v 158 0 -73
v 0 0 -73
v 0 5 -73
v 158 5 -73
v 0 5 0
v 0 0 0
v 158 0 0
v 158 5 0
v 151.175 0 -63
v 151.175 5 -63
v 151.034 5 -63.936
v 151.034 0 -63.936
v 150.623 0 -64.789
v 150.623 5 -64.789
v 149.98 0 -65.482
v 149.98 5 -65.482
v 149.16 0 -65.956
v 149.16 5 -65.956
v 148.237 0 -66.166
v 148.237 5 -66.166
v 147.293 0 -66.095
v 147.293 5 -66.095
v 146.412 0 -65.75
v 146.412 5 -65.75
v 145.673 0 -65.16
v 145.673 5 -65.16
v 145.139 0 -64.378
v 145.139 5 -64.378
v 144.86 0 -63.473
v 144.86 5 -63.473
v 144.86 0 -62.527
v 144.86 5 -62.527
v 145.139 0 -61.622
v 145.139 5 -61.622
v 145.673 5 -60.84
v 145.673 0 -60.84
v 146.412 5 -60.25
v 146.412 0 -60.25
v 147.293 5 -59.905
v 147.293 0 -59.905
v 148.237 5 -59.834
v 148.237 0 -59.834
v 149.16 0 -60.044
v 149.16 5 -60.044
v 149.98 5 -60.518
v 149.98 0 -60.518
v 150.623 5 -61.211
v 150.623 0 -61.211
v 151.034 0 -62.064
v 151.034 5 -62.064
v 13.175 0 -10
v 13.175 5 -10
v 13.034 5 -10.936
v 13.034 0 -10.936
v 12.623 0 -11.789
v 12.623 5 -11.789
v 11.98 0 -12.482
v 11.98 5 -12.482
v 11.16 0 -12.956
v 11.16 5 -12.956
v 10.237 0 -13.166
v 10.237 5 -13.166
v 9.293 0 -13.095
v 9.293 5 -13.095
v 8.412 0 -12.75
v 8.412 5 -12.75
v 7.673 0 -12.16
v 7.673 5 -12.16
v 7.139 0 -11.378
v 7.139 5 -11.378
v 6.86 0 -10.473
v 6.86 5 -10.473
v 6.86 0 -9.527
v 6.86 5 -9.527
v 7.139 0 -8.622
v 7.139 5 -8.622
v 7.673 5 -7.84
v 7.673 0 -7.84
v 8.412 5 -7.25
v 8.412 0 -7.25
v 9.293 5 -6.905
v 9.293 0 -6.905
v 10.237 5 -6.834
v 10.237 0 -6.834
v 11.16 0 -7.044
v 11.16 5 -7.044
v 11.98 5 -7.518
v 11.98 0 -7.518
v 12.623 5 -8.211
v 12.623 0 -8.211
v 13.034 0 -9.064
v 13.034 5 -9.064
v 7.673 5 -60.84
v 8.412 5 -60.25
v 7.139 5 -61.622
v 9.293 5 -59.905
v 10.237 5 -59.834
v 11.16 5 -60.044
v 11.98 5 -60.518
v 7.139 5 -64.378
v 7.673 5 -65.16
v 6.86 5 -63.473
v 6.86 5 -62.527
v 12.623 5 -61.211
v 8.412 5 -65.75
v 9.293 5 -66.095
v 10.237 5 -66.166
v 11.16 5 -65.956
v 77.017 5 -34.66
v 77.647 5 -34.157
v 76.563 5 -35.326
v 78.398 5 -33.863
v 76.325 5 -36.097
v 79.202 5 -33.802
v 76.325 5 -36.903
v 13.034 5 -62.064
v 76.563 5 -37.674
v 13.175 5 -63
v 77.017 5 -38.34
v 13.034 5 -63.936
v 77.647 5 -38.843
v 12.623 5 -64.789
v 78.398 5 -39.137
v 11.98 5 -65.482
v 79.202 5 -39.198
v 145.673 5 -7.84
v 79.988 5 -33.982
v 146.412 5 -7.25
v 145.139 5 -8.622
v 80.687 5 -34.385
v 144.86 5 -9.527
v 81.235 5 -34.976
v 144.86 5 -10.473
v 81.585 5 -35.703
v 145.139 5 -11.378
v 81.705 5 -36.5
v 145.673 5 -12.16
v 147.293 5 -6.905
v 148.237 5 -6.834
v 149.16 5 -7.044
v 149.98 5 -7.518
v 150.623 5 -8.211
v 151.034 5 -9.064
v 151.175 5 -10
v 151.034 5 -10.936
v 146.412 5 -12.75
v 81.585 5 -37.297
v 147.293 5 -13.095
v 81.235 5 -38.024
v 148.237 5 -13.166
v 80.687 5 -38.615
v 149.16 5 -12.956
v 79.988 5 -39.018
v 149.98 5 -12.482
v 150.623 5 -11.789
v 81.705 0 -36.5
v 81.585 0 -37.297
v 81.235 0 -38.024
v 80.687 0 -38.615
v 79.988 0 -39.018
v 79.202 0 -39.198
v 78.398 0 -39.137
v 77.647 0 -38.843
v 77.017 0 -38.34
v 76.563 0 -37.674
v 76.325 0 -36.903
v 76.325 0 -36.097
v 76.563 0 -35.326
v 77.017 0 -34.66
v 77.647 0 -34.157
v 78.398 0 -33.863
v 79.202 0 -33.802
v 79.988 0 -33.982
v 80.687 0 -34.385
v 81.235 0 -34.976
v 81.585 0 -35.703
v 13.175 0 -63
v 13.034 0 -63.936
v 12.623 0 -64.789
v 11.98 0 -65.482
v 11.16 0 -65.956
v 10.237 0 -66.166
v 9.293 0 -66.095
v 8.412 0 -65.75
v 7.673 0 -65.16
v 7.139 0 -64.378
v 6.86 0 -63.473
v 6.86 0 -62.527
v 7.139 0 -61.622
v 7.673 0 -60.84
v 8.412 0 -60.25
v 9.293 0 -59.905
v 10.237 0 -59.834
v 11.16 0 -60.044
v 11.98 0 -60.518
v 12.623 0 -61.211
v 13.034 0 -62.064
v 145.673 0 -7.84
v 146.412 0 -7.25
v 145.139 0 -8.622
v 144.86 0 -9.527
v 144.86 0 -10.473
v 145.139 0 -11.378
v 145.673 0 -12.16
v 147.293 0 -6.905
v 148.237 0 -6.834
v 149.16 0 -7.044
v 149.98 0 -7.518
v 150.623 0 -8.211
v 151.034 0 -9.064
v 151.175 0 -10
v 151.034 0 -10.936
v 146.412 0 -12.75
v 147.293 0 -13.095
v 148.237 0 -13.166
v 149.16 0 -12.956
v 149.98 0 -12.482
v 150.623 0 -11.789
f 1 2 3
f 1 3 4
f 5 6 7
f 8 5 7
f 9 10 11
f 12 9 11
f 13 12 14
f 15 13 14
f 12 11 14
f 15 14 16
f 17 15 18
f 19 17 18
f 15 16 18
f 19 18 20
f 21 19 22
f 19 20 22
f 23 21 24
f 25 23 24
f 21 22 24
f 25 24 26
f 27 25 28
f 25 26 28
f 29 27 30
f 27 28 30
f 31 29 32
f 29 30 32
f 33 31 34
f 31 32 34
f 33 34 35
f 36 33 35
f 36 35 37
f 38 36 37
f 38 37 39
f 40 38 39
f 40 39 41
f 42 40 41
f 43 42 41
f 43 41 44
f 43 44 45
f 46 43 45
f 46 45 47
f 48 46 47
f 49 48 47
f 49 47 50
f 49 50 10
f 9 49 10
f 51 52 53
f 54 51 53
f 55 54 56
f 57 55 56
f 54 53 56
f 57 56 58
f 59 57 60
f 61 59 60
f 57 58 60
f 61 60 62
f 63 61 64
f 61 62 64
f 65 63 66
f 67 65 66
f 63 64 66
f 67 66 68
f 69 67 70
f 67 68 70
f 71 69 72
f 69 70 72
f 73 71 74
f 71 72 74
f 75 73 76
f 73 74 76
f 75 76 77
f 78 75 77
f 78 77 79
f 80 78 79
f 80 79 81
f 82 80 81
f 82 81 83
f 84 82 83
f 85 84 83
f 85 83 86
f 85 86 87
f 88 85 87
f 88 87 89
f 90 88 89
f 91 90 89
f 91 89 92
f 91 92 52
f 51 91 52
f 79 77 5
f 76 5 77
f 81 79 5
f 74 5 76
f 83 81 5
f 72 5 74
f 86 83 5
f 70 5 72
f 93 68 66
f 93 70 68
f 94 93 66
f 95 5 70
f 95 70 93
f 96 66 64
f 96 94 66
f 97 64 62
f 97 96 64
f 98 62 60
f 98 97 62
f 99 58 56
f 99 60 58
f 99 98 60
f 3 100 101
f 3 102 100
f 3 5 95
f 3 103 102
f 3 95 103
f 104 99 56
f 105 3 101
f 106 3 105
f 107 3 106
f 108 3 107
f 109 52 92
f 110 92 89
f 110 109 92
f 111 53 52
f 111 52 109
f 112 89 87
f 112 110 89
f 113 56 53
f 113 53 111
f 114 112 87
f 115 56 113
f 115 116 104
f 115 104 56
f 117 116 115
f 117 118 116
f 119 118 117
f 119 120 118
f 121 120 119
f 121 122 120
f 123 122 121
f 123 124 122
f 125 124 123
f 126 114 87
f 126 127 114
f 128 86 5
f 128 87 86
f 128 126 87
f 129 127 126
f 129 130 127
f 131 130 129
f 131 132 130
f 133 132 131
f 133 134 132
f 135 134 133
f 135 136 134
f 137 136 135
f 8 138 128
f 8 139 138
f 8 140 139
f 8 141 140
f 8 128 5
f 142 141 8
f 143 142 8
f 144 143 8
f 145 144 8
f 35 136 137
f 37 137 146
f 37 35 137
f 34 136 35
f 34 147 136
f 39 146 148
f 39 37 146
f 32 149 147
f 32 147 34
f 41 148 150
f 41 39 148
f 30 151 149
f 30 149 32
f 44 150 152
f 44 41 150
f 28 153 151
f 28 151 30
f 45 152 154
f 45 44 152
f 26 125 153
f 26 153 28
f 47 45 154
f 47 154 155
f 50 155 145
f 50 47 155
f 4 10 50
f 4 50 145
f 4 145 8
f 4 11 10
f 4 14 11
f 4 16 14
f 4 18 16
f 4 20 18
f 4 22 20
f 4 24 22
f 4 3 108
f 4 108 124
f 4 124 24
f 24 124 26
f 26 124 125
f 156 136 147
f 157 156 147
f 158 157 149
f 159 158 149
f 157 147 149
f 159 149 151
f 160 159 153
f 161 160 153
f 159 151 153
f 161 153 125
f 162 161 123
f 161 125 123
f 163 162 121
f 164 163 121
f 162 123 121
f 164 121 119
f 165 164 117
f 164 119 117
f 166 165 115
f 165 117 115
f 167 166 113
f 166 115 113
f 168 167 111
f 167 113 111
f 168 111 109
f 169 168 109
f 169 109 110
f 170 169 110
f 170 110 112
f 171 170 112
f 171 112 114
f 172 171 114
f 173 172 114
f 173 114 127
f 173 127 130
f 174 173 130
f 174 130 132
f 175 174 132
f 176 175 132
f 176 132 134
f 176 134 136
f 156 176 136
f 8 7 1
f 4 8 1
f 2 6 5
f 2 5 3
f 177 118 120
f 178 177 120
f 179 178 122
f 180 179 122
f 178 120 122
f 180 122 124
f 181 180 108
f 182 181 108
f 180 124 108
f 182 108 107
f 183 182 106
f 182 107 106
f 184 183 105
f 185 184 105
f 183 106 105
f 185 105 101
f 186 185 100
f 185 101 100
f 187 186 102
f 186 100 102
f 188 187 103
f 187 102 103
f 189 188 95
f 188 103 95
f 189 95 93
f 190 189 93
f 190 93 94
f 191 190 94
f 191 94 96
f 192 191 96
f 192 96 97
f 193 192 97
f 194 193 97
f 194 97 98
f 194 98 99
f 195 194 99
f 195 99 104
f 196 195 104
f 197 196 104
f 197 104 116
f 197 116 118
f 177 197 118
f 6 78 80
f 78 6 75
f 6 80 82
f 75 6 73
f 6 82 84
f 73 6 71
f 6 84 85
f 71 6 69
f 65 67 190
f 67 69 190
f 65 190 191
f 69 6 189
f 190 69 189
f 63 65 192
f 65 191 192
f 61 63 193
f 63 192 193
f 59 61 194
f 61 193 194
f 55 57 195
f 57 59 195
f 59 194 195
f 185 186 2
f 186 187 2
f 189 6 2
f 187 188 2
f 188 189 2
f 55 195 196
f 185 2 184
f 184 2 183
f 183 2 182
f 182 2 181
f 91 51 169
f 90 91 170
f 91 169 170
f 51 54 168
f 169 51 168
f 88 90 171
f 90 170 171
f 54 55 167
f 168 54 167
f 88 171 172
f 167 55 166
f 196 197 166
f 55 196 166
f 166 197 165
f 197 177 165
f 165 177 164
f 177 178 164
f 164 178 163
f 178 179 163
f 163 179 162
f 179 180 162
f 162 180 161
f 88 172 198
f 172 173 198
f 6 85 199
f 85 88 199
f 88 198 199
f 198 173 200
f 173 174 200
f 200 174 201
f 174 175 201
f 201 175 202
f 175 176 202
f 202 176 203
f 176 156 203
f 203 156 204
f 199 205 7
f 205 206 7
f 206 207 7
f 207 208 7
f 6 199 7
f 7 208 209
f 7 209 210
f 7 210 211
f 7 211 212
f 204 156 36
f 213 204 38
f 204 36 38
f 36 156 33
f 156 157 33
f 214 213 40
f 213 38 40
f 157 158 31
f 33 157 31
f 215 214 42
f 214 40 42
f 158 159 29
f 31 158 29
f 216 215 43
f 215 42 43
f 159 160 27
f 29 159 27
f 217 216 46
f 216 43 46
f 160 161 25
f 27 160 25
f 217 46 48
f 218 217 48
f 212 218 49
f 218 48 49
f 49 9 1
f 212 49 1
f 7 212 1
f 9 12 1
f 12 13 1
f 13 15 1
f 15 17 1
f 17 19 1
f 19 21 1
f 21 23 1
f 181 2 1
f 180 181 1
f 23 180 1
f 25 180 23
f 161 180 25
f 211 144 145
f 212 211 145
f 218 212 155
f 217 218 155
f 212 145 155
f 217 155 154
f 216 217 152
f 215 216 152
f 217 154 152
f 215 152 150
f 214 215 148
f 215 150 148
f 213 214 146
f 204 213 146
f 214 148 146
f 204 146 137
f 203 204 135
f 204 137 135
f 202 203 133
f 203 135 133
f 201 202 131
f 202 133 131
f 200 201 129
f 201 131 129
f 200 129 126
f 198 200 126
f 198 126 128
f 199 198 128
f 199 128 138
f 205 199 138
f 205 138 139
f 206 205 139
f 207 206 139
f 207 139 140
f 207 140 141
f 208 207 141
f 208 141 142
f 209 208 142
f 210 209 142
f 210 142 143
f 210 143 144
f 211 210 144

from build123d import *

# Parameters (mm, degrees)
SKETCH1_W                   = 158
SKETCH1_H                   = 73
RIGHT_WALL_DEPTH            = 5
F_1_4_0_2500_DOWEL_HOLE1_D  = 6.35
TAP_DRILL_FOR_1_4_28_TAP2_D = 5.4102


with BuildPart() as part:
    # Sketch1 → right wall (new body)
    with BuildSketch(Plane(origin=(0, 0, 0), x_dir=(1, 0, 0), z_dir=(0, 1, 0))):
        with Locations((79, 36.5)):
            Rectangle(SKETCH1_W, SKETCH1_H)
    extrude(amount=RIGHT_WALL_DEPTH)

    # 1/4 (0.2500) Dowel Hole1 (through all)
    with Locations(Plane(origin=(0, 0, 0), x_dir=(-1, 0, 0), z_dir=(0, -1, 0))):
        with Locations((-10, 10), (-10, 63), (-148, 63), (-148, 10)):
            Hole(F_1_4_0_2500_DOWEL_HOLE1_D / 2)

    # Tap Drill for 1/4-28 Tap2 (through all)
    with Locations(Plane(origin=(0, 0, 0), x_dir=(-1, 0, 0), z_dir=(0, -1, 0))):
        with Locations((-79, 36.5)):
            Hole(TAP_DRILL_FOR_1_4_28_TAP2_D / 2)


solid = part.part
